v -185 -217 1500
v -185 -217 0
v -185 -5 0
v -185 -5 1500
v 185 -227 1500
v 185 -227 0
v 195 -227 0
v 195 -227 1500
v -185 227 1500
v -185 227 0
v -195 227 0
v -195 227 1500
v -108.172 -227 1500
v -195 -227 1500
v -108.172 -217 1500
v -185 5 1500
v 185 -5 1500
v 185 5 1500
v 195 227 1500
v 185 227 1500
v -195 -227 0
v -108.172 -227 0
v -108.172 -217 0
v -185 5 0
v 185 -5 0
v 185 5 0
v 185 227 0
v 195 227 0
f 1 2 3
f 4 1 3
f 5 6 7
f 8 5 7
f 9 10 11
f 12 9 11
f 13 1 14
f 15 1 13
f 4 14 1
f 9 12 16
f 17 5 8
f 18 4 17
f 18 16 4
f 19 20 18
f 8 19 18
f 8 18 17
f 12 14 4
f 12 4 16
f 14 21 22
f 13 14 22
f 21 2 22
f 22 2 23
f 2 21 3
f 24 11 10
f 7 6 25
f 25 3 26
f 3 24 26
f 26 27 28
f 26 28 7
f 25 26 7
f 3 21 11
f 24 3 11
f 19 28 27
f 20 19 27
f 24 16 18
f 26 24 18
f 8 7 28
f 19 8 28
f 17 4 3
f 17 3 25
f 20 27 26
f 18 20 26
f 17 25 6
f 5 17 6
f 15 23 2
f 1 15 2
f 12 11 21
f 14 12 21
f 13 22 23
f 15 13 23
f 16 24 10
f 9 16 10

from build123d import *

# Parameters (mm, degrees)
F0_W     = 370
F0_H     = 10
F1_DEPTH = 1500


with BuildPart() as f1:
    # F0 (on Top) → F1 (new body)
    with BuildSketch(Plane.XY):
        Polygon((185, -227), (195, -227), (195, 227), (185, 227), (185, 217), (185, 5), (185, -5), (185, -217), align=None)
        Rectangle(F0_W, F0_H)
        Polygon((-185, -217), (-185, -5), (-185, 5), (-185, 217), (-185, 227), (-195, 227), (-195, -227), (-108.172141, -227), (-108.172141, -217), align=None)
    extrude(amount=F1_DEPTH)


solid = f1.part
